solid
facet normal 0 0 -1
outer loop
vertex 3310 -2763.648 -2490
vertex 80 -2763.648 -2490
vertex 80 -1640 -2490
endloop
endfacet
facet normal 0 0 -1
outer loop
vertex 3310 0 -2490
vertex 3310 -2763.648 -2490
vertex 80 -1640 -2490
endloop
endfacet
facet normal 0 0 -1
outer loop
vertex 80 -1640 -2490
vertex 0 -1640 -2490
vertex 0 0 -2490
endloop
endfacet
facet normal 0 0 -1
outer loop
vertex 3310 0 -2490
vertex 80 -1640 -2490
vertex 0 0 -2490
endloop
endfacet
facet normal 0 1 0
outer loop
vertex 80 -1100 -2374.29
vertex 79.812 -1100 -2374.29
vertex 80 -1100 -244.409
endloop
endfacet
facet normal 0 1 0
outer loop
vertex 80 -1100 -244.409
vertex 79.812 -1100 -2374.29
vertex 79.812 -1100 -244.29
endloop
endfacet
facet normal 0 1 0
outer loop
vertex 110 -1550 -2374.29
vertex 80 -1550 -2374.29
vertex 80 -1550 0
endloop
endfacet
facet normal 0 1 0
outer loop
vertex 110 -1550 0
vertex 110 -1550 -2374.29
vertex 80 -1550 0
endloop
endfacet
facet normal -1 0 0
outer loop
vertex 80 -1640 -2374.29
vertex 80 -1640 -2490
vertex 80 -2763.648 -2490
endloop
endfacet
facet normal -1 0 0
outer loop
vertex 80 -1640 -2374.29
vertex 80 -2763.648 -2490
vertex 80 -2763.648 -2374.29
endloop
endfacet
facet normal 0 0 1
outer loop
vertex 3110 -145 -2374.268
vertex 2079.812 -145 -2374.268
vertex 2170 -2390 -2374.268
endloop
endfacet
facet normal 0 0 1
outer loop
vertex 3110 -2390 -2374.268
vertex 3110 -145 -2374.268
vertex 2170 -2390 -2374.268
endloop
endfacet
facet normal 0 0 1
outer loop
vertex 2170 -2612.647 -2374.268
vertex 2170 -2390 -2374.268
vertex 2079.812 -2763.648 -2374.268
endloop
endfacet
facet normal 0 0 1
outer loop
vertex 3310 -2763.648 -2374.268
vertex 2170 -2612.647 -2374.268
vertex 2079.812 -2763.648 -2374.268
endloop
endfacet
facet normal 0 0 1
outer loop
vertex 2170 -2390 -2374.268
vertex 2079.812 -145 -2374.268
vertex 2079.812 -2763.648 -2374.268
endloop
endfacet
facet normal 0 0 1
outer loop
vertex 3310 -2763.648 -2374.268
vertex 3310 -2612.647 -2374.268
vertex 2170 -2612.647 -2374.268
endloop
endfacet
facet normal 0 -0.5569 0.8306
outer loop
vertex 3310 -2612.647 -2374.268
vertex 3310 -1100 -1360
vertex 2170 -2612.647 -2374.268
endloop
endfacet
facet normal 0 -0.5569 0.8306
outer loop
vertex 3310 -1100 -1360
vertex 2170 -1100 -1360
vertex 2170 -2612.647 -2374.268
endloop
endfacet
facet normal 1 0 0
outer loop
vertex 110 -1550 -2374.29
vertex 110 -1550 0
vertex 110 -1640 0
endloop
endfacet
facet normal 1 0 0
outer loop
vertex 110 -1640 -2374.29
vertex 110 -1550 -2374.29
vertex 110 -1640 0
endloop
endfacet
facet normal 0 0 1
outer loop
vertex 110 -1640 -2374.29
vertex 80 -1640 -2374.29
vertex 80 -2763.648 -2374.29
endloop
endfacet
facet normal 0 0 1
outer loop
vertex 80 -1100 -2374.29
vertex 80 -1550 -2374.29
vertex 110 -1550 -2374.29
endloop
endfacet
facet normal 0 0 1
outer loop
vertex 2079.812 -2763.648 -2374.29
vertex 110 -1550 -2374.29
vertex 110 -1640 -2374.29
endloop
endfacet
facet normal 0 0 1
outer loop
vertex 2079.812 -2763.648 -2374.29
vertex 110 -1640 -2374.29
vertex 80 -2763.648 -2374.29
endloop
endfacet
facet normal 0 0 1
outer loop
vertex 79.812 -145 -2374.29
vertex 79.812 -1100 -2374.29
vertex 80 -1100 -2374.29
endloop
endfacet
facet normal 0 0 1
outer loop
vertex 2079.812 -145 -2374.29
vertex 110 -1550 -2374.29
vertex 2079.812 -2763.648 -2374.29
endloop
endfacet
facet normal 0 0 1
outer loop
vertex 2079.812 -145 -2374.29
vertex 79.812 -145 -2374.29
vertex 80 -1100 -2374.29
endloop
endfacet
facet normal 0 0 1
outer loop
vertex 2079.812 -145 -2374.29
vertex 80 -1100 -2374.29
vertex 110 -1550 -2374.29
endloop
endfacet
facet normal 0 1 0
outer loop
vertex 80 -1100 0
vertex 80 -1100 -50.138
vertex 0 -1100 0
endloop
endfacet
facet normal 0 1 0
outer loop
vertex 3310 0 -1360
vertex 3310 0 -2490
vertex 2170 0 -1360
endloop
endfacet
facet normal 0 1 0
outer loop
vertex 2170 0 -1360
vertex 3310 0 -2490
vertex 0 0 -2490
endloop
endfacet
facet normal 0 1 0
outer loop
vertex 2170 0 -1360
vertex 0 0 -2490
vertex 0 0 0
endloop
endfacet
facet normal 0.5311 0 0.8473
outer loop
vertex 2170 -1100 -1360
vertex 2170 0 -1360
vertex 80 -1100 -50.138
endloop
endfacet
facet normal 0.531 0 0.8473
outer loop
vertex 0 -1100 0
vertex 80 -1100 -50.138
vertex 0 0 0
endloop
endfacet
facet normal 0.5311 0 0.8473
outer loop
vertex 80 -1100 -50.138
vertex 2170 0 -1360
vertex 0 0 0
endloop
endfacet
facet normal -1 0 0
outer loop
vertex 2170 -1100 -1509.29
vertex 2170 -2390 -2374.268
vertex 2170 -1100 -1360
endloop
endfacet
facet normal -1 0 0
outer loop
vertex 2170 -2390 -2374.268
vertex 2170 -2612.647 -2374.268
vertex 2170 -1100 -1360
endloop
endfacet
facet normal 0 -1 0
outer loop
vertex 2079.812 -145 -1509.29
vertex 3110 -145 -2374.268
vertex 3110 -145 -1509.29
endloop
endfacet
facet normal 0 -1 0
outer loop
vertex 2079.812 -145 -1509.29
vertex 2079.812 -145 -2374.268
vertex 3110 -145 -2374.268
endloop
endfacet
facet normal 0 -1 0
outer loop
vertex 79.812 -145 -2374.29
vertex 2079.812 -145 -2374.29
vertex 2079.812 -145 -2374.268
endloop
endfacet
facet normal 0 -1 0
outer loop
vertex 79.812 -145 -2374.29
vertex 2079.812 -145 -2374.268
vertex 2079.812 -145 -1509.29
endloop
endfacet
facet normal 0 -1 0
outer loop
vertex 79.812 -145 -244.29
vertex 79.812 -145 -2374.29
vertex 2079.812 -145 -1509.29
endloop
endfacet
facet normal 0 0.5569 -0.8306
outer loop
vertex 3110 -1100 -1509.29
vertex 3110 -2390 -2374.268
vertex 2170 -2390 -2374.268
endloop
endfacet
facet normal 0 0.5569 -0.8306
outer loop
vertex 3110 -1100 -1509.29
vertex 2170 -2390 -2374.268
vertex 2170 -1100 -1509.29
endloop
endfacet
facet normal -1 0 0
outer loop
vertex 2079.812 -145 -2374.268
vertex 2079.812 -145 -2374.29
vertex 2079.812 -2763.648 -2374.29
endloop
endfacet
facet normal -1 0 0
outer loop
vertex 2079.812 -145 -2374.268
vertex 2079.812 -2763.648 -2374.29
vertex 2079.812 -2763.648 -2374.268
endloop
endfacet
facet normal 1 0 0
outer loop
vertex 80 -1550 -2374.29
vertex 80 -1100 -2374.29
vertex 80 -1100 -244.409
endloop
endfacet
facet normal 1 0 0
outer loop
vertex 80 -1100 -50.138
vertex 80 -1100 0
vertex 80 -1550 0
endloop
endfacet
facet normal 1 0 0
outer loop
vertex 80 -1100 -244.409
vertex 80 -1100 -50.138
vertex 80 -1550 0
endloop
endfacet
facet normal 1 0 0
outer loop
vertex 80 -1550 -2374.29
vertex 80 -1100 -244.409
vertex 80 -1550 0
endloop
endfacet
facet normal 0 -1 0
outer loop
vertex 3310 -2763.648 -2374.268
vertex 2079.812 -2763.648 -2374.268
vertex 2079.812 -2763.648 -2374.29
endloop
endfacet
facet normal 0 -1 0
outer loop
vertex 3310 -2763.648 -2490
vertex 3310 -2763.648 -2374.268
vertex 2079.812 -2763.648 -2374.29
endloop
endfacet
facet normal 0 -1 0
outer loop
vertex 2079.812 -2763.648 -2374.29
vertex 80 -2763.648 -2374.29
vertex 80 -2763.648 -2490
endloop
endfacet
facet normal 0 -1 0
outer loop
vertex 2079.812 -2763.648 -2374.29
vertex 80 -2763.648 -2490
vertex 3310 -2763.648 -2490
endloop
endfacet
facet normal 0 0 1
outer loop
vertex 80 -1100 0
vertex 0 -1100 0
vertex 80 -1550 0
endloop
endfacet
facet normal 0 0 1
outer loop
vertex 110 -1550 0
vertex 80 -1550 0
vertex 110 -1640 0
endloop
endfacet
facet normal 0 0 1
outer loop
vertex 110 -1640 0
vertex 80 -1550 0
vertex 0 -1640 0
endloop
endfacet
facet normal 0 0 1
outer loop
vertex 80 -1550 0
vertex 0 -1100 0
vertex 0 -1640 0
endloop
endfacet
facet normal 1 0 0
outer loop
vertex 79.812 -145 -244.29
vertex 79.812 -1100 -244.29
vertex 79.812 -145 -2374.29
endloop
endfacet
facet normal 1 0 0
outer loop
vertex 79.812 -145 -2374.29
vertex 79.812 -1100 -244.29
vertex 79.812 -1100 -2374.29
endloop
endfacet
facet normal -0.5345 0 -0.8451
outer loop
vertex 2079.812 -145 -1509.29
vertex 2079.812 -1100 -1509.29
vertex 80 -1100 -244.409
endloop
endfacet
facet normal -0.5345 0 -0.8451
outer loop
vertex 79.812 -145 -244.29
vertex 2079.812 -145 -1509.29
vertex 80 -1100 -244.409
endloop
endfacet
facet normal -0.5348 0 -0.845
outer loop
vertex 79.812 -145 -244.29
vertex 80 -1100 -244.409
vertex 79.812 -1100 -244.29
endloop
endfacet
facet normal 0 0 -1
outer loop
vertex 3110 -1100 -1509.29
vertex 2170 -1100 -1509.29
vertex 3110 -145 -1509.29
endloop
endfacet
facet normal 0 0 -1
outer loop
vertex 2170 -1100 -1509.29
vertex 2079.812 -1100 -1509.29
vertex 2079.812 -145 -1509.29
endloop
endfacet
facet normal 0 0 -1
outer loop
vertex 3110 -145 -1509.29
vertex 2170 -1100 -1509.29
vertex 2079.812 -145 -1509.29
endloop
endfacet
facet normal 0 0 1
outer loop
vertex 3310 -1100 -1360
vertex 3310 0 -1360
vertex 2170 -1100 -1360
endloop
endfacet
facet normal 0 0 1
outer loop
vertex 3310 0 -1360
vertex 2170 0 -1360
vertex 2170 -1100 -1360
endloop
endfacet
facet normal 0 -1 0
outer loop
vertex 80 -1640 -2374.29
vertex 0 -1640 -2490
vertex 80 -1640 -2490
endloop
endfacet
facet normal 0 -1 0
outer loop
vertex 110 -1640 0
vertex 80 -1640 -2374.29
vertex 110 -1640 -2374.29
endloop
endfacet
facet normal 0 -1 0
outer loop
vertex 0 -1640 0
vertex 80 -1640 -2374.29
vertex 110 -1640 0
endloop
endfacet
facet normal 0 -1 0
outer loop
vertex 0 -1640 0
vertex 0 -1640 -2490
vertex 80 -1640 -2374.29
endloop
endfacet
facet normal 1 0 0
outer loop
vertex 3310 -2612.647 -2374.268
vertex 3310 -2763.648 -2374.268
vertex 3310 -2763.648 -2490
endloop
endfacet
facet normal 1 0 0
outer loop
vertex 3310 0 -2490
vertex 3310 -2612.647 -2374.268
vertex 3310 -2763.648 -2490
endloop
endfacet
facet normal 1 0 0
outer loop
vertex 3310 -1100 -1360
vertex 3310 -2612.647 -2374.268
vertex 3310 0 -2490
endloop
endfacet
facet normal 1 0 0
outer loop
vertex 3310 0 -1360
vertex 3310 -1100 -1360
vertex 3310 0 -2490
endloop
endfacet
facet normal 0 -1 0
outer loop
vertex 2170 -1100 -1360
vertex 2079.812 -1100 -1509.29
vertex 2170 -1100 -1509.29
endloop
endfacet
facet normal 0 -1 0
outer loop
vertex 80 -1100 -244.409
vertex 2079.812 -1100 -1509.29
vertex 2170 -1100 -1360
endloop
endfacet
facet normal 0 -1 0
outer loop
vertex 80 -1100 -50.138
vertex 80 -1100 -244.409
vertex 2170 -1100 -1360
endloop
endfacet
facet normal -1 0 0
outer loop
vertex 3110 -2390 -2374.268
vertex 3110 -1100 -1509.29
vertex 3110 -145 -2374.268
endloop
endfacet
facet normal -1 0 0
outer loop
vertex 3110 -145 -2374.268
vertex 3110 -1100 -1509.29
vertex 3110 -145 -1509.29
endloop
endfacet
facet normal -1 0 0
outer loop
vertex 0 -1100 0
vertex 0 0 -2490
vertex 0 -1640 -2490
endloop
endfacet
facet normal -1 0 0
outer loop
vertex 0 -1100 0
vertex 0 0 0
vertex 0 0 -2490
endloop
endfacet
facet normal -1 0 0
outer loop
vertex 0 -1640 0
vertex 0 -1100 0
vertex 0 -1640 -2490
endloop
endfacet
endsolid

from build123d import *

# Parameters (mm, degrees)
F1_DEPTH  = 1100
F3_DEPTH  = 955
F4_W      = 450
F4_H      = 2490
F5_DEPTH  = 80
F6_W      = 90
F6_H      = 2490
F7_DEPTH  = 110
F8_W      = 90.1878520287
F8_H      = 864.9774521589
F9_DEPTH  = 955
F10_DEPTH = 940
F11_DEPTH = 1290
F13_DEPTH = 940
F14_DEPTH = 373.64776
F16_DEPTH = 200


with BuildPart() as f1:
    # F0 (on Front) → F1 (new body)
    with BuildSketch(Plane.XZ):
        Polygon((2170, -1360), (0, 0), (0, -2490), (2170, -2490), align=None)
    extrude(amount=F1_DEPTH)

    # F2 (on face) → F3 (cut)
    with BuildSketch(Plane.XZ.offset(1100)):
        Polygon((2079.8121479713, -1509.2901259661), (79.8121479713, -244.2901259661), (79.8121479713, -2374.2901259661), (2079.8121479713, -2374.2901259661), align=None)
    extrude(amount=-F3_DEPTH, mode=Mode.SUBTRACT)

    # F4 (on face) → F5 (join)
    with BuildSketch(Plane(origin=(0, 0, 0), x_dir=(0, -1, 0), z_dir=(-1, 0, 0))):
        with Locations((1325, -1245)):
            Rectangle(F4_W, F4_H)
    extrude(amount=-F5_DEPTH)

    # F6 (on face) → F7 (join)
    with BuildSketch(Plane(origin=(0, 0, 0), x_dir=(0, -1, 0), z_dir=(-1, 0, 0))):
        with Locations((1595, -1245)):
            Rectangle(F6_W, F6_H)
    extrude(amount=-F7_DEPTH)

    # F8 (on face) → F9 (cut)
    with BuildSketch(Plane.XZ.offset(1100)):
        with Locations((2124.9060739856, -1941.7788520455)):
            Rectangle(F8_W, F8_H)
    extrude(amount=-F9_DEPTH, mode=Mode.SUBTRACT)

    # F10 (add): a face of the model
    f10_faces = [f1.faces().sort_by_distance(p)[0] for p in [
        (2170, -15.769908053, -1925),
    ]]
    extrude(f10_faces, amount=F10_DEPTH)

    # F11 (add): a face of the model
    f11_faces = [f1.faces().sort_by_distance(p)[0] for p in [
        (1595.0662428142, -1100, -2432.1412294023),
    ]]
    extrude(f11_faces, amount=F11_DEPTH)

    # F14 (add): a face of the model
    f14_faces = [f1.faces().sort_by_distance(p)[0] for p in [
        (1595.0662428142, -2390, -2432.1412294023),
    ]]


with BuildPart() as f13:
    # F12 (on face) → F13 (new body)
    with BuildSketch(Plane.YZ.offset(3110)):
        Polygon((-2390, -2374.267578125), (-1100, -1509.2901259661), (-1100, -1360), (-2619.9676820473, -2379.1765682024), align=None)
    extrude(amount=-F13_DEPTH)


with BuildPart() as f1_1:
    add(f1.part)

    add(f13.part)  # F14 merges F13
    extrude(f14_faces, amount=F14_DEPTH)

    # F15 (on face) → F16 (join)
    with BuildSketch(Plane.YZ.offset(3110)):
        Polygon((0, -2490), (0, -1360), (-1100, -1360), (-2612.6465695904, -2374.267578125), (-2763.64776, -2374.267578125), (-2763.64776, -2490), align=None)
    extrude(amount=F16_DEPTH)


solid = f1_1.part
